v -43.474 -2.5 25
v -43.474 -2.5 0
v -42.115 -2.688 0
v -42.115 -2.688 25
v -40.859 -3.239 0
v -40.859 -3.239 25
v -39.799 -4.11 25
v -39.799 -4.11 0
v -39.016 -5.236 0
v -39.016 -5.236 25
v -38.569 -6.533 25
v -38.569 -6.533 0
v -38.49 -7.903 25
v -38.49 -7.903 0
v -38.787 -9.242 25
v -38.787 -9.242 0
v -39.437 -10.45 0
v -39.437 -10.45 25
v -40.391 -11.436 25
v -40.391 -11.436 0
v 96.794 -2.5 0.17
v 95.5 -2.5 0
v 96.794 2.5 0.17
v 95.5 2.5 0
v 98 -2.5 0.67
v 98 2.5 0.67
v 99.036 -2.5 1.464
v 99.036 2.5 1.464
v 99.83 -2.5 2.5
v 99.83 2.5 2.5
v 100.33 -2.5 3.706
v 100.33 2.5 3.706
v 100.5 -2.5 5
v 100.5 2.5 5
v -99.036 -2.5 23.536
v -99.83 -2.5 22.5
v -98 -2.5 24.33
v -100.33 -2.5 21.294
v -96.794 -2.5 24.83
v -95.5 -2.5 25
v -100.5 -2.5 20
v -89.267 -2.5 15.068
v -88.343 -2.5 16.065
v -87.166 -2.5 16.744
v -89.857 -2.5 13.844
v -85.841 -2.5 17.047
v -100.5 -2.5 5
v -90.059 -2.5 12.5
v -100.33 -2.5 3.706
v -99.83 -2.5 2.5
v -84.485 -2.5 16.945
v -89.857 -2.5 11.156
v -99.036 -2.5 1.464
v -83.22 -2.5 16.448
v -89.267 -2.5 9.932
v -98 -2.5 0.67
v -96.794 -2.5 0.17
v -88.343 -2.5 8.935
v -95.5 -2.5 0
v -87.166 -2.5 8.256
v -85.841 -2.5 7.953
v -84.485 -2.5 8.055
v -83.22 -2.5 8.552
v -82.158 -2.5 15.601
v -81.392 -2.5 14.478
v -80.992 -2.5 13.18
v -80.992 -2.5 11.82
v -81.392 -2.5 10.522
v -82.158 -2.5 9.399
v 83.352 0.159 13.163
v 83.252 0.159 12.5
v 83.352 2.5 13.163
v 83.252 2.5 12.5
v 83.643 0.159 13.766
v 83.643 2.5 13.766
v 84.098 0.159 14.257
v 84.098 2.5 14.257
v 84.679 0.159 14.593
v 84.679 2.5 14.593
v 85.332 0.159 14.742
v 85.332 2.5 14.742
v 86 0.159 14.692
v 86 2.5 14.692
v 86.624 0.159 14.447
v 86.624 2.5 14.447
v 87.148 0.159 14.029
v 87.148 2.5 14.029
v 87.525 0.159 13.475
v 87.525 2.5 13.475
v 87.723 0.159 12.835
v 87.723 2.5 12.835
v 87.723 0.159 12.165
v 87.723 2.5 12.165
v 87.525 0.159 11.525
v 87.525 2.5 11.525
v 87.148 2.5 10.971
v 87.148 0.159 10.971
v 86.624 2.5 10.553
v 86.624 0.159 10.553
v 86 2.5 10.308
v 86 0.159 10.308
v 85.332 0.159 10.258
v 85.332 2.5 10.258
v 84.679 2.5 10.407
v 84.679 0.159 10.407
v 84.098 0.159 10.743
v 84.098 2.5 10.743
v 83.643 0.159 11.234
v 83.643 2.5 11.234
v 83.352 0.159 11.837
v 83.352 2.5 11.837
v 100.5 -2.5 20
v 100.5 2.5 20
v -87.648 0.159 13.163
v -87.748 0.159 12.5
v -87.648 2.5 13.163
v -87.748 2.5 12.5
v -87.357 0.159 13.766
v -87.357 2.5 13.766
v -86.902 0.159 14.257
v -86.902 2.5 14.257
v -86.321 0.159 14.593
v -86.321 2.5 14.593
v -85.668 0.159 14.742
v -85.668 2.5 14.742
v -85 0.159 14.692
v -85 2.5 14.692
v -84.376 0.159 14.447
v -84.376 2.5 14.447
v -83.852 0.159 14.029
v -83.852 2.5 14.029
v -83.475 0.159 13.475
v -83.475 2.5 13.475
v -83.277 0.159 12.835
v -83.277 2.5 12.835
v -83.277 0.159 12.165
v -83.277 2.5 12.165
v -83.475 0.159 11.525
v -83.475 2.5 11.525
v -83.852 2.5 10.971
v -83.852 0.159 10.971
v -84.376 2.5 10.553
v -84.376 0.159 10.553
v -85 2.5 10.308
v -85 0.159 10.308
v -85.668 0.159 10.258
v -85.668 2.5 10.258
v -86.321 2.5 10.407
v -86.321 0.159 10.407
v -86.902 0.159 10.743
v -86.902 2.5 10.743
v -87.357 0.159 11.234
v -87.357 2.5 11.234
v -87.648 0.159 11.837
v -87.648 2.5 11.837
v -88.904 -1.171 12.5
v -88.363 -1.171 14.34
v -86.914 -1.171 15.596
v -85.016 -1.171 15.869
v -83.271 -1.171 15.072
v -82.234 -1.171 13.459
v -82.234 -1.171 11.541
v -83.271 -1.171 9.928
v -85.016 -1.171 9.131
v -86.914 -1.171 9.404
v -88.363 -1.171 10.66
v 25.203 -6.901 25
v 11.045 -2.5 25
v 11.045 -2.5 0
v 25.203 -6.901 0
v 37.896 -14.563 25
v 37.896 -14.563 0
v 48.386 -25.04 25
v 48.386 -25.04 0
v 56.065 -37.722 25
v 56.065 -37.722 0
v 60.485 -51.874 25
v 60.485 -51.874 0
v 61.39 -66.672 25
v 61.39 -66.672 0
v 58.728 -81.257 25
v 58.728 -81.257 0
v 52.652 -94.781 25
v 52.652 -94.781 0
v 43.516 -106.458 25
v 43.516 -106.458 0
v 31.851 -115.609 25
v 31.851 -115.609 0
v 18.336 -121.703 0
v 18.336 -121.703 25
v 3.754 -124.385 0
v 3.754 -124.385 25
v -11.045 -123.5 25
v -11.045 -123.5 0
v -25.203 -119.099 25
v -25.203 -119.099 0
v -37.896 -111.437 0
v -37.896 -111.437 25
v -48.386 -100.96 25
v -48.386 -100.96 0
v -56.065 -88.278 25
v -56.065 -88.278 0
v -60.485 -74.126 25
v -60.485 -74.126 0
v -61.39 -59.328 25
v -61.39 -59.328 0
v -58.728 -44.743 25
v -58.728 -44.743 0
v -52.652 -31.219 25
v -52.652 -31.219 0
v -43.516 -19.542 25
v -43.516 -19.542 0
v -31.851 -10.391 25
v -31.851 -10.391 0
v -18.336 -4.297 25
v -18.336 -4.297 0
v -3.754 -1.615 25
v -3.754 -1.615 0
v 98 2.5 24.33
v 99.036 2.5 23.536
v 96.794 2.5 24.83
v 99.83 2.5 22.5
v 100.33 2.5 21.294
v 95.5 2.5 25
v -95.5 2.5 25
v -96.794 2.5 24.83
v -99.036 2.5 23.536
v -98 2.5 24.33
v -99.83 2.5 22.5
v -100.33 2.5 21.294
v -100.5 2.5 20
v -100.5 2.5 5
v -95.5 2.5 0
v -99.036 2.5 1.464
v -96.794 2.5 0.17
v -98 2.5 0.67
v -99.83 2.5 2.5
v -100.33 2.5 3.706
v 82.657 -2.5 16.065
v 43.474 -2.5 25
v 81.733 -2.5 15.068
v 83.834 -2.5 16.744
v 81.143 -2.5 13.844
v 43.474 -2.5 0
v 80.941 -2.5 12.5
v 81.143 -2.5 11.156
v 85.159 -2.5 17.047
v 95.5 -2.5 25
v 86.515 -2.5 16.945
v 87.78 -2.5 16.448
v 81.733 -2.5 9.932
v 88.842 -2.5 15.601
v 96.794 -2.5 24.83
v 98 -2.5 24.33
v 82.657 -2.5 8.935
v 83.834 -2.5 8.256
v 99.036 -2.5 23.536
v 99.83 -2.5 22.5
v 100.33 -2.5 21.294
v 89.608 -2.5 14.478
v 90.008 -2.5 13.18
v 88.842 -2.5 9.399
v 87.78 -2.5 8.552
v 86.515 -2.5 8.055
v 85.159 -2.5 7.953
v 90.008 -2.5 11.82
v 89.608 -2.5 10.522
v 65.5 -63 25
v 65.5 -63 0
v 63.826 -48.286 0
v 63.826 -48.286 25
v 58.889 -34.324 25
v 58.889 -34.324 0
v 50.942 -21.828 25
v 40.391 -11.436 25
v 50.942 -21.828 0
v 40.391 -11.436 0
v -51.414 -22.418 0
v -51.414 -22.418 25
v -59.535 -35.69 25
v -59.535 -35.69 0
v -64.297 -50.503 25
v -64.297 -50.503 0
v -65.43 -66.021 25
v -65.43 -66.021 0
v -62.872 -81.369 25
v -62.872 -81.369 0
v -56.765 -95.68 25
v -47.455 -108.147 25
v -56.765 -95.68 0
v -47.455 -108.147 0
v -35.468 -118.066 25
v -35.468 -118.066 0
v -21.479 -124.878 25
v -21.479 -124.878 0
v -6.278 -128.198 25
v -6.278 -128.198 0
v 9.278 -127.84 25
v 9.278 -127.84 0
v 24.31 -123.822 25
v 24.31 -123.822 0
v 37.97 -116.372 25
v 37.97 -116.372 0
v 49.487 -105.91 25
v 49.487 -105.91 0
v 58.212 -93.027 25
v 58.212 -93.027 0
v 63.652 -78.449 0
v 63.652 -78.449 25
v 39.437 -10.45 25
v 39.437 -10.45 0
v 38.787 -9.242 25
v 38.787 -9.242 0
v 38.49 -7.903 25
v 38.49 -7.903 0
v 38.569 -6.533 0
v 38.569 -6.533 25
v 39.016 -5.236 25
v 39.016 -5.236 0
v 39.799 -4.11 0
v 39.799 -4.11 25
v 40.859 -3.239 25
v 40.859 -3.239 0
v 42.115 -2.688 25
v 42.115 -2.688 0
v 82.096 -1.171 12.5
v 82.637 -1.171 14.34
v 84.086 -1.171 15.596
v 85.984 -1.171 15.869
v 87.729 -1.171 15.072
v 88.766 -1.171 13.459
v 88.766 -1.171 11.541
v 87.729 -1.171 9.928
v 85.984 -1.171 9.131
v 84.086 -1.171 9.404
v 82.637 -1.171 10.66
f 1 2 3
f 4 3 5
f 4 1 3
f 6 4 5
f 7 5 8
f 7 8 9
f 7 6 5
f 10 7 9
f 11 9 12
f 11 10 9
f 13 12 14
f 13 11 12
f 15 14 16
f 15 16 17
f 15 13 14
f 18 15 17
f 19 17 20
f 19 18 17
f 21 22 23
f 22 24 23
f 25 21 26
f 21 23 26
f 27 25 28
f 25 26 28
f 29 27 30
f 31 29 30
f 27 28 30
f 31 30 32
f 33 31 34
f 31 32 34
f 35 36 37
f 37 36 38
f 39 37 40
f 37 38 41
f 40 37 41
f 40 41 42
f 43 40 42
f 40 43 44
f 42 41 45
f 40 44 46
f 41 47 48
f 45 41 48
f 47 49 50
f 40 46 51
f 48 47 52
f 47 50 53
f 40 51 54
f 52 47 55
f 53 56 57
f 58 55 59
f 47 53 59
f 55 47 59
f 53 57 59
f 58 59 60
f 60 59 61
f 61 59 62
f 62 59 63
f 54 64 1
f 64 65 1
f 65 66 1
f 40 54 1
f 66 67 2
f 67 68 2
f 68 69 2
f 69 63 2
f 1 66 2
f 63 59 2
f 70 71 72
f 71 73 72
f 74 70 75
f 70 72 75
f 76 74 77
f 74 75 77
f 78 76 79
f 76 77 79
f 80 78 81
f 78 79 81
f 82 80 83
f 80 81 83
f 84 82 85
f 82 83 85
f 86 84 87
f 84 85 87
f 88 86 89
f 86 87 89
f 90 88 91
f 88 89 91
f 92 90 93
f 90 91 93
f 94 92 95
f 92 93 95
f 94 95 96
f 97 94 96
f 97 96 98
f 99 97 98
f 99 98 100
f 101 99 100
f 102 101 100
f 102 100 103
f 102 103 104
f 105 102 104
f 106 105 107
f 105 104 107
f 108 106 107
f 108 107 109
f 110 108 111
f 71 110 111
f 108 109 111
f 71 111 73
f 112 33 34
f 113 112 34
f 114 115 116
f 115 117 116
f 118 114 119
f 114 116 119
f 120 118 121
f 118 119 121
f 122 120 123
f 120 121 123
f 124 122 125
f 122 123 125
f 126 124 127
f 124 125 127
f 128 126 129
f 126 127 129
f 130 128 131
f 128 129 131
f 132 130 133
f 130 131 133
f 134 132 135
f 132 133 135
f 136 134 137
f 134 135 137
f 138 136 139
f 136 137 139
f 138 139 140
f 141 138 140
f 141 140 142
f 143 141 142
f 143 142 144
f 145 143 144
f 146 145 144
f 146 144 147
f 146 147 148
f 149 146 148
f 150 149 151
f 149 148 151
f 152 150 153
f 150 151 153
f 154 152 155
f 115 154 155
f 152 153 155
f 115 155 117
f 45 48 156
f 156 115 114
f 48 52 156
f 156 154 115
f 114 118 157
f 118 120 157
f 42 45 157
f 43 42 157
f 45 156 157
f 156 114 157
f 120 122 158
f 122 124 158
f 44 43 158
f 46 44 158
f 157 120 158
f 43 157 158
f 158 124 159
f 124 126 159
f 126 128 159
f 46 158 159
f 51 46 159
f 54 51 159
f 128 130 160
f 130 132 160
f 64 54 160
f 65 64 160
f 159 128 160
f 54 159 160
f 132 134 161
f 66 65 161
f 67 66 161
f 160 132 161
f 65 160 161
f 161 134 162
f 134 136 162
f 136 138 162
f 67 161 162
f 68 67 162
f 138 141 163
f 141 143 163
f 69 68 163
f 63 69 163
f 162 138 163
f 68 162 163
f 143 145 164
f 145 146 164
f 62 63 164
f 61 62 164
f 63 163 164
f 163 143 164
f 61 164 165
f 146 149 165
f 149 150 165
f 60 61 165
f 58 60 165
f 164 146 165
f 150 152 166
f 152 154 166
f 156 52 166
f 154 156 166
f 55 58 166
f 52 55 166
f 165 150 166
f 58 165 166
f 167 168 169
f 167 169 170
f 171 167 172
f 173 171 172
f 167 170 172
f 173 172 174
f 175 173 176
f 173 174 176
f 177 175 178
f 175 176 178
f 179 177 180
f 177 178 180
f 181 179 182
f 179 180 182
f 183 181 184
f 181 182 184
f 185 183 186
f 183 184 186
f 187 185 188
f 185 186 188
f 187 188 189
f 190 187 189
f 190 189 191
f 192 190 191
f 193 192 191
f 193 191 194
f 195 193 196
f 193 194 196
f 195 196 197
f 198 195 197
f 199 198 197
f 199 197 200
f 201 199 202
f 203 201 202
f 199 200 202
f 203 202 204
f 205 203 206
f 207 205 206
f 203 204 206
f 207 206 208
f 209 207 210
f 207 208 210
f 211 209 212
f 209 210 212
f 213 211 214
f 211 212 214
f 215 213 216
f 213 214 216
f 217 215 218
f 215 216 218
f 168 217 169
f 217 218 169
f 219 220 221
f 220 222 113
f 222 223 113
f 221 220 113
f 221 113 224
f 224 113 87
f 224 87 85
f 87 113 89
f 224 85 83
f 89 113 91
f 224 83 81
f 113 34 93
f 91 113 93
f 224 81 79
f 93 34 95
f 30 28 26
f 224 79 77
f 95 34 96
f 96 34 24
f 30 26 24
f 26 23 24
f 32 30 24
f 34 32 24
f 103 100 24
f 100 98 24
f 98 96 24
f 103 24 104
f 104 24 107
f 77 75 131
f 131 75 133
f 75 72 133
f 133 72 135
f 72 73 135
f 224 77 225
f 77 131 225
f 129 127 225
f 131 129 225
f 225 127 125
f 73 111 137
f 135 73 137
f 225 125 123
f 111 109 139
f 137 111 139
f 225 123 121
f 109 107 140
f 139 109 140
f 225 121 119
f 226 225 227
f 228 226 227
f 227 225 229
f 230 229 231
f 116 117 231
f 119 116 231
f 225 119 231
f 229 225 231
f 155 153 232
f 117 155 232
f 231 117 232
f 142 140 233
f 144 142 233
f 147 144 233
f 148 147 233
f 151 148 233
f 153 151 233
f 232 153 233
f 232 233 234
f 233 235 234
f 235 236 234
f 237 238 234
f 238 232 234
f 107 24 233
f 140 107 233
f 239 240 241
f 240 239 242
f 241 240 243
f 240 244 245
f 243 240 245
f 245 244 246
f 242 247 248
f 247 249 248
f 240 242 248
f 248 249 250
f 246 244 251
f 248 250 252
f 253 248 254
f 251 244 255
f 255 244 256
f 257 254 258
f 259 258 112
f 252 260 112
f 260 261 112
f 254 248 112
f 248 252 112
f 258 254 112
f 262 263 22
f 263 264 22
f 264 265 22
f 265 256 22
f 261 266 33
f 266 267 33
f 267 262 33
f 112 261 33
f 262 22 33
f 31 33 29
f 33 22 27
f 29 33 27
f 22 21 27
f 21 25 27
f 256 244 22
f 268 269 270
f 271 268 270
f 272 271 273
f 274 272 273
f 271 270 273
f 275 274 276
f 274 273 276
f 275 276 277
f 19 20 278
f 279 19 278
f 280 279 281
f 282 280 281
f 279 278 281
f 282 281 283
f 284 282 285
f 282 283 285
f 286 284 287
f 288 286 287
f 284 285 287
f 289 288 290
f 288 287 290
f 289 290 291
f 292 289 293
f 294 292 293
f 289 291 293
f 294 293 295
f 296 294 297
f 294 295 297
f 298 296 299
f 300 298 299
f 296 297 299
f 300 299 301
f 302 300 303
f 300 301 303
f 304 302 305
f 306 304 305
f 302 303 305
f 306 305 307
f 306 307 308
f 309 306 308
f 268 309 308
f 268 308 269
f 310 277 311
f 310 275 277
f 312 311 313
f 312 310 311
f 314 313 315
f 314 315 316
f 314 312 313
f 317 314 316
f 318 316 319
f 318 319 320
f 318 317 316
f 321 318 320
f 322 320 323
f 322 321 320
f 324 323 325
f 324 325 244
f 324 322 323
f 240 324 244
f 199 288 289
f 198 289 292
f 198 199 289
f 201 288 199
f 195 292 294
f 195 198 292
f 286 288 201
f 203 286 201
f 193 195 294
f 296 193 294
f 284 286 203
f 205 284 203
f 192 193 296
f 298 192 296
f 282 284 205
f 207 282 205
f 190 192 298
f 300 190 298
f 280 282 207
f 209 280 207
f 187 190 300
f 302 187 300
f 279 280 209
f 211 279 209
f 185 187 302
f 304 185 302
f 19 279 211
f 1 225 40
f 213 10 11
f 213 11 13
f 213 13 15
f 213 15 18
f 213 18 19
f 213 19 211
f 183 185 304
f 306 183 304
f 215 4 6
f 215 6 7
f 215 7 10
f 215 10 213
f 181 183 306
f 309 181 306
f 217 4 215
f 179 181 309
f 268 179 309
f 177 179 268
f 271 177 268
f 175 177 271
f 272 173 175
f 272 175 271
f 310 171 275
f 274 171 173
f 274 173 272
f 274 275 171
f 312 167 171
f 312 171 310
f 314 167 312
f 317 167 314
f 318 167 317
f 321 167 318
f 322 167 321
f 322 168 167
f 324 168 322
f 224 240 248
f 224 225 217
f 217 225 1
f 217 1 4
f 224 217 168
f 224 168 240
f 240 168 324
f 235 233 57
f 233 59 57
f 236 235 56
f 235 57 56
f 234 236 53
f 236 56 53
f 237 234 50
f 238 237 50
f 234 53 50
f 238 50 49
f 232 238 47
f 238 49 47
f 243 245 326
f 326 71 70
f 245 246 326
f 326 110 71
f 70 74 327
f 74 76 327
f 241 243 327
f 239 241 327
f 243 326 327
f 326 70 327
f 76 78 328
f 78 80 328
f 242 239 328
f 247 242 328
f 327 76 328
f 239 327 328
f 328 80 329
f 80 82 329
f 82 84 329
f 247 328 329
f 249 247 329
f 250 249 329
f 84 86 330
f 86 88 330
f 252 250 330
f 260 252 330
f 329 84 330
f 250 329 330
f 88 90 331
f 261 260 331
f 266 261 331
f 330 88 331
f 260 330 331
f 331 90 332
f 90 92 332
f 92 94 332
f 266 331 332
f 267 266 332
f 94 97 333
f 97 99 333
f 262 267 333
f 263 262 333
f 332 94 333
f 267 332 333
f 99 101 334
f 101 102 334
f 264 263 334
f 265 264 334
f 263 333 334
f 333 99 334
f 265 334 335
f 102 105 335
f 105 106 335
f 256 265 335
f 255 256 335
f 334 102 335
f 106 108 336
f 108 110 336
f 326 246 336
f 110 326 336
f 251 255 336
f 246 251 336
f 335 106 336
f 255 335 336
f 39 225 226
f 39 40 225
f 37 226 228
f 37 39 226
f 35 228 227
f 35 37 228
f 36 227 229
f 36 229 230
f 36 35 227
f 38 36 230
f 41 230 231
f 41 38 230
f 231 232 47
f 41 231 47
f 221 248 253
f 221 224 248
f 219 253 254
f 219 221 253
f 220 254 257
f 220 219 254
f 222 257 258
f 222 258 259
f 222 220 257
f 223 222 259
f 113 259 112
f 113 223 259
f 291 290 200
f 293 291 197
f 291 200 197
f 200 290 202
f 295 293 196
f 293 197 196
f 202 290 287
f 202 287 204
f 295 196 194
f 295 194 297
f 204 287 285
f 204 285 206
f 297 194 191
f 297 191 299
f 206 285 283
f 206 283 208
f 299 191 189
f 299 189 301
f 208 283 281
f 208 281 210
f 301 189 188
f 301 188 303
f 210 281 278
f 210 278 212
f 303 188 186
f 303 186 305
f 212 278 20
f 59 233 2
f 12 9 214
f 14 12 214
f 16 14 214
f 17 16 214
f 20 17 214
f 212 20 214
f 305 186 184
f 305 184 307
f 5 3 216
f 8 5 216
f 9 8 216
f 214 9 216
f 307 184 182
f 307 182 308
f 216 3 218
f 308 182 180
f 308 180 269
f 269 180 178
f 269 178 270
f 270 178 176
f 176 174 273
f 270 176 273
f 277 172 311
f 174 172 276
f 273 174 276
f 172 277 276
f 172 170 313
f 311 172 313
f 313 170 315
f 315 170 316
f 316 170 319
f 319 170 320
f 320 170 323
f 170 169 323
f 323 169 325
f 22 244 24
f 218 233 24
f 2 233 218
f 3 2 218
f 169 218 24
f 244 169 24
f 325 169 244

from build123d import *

# Parameters (mm, degrees)
F1_DEPTH       = 25
F2_R           = 5
F3_R           = 5
F5_D           = 4.4958
F5_DEPTH       = 5
F5_CSINK_D     = 9.1186
F5_CSINK_ANGLE = 82
F5_TIP         = 1.3506745855


with BuildPart() as f1:
    # F0 (on Top) → F1 (new body)
    with BuildSketch(Plane.XY):
        with BuildLine():
            ThreePointArc((65.5, -63), (54.4714923246, -26.6254687462), (25.099800796, -2.5))
            Line((25.099800796, -2.5), (11.0453610172, -2.5))
            ThreePointArc((11.0453610172, -2.5), (47.2310263627, -23.6111672079), (61.5, -63))
            ThreePointArc((61.5, -63), (-39.3888327921, -110.2310263627), (-11.0453610172, -2.5))
            Line((-11.0453610172, -2.5), (-25.099800796, -2.5))
            ThreePointArc((-25.099800796, -2.5), (-36.3745312538, -117.4714923246), (65.5, -63))
        make_face()
        with BuildLine():
            Line((0, 2.5), (-100.5, 2.5))
            Line((-100.5, 2.5), (-100.5, -2.5))
            Line((-100.5, -2.5), (-25.099800796, -2.5))
            ThreePointArc((-25.099800796, -2.5), (-12.7964838921, 1.2378393161), (0, 2.5))
        make_face()
        with BuildLine():
            ThreePointArc((25.099800796, -2.5), (12.7964838921, 1.2378393161), (0, 2.5))
            ThreePointArc((0, 2.5), (-12.7964838921, 1.2378393161), (-25.099800796, -2.5))
            Line((-25.099800796, -2.5), (-11.0453610172, -2.5))
            ThreePointArc((-11.0453610172, -2.5), (0, -1.5), (11.0453610172, -2.5))
            Line((11.0453610172, -2.5), (25.099800796, -2.5))
        make_face()
        with BuildLine():
            Line((100.5, 2.5), (0, 2.5))
            ThreePointArc((0, 2.5), (12.7964838921, 1.2378393161), (25.099800796, -2.5))
            Line((25.099800796, -2.5), (100.5, -2.5))
            Line((100.5, -2.5), (100.5, 2.5))
        make_face()
    extrude(amount=F1_DEPTH)

    # F2
    f2_edges = [f1.edges().sort_by_distance(p)[0] for p in [
        (-25.099801, -2.5, 12.5),
        (25.099801, -2.5, 12.5),
    ]]
    fillet(f2_edges, radius=F2_R)

    # F3
    f3_edges = [f1.edges().sort_by_distance(p)[0] for p in [
        (-100.5, 0, 25),
        (-100.5, 0, 0),
        (100.5, 0, 25),
        (100.5, 0, 0),
    ]]
    fillet(f3_edges, radius=F3_R)

    # F5
    with Locations(Plane.XZ.offset(2.5)):
        with Locations((-85.5, 12.5), (85.5, 12.5)):
            CounterSinkHole(F5_D / 2, F5_CSINK_D / 2, depth=F5_DEPTH, counter_sink_angle=F5_CSINK_ANGLE)
            with Locations((0, 0, -(F5_DEPTH + F5_TIP / 2))):  # 118° drill point
                Cone(0, F5_D / 2, F5_TIP, mode=Mode.SUBTRACT)


solid = f1.part
